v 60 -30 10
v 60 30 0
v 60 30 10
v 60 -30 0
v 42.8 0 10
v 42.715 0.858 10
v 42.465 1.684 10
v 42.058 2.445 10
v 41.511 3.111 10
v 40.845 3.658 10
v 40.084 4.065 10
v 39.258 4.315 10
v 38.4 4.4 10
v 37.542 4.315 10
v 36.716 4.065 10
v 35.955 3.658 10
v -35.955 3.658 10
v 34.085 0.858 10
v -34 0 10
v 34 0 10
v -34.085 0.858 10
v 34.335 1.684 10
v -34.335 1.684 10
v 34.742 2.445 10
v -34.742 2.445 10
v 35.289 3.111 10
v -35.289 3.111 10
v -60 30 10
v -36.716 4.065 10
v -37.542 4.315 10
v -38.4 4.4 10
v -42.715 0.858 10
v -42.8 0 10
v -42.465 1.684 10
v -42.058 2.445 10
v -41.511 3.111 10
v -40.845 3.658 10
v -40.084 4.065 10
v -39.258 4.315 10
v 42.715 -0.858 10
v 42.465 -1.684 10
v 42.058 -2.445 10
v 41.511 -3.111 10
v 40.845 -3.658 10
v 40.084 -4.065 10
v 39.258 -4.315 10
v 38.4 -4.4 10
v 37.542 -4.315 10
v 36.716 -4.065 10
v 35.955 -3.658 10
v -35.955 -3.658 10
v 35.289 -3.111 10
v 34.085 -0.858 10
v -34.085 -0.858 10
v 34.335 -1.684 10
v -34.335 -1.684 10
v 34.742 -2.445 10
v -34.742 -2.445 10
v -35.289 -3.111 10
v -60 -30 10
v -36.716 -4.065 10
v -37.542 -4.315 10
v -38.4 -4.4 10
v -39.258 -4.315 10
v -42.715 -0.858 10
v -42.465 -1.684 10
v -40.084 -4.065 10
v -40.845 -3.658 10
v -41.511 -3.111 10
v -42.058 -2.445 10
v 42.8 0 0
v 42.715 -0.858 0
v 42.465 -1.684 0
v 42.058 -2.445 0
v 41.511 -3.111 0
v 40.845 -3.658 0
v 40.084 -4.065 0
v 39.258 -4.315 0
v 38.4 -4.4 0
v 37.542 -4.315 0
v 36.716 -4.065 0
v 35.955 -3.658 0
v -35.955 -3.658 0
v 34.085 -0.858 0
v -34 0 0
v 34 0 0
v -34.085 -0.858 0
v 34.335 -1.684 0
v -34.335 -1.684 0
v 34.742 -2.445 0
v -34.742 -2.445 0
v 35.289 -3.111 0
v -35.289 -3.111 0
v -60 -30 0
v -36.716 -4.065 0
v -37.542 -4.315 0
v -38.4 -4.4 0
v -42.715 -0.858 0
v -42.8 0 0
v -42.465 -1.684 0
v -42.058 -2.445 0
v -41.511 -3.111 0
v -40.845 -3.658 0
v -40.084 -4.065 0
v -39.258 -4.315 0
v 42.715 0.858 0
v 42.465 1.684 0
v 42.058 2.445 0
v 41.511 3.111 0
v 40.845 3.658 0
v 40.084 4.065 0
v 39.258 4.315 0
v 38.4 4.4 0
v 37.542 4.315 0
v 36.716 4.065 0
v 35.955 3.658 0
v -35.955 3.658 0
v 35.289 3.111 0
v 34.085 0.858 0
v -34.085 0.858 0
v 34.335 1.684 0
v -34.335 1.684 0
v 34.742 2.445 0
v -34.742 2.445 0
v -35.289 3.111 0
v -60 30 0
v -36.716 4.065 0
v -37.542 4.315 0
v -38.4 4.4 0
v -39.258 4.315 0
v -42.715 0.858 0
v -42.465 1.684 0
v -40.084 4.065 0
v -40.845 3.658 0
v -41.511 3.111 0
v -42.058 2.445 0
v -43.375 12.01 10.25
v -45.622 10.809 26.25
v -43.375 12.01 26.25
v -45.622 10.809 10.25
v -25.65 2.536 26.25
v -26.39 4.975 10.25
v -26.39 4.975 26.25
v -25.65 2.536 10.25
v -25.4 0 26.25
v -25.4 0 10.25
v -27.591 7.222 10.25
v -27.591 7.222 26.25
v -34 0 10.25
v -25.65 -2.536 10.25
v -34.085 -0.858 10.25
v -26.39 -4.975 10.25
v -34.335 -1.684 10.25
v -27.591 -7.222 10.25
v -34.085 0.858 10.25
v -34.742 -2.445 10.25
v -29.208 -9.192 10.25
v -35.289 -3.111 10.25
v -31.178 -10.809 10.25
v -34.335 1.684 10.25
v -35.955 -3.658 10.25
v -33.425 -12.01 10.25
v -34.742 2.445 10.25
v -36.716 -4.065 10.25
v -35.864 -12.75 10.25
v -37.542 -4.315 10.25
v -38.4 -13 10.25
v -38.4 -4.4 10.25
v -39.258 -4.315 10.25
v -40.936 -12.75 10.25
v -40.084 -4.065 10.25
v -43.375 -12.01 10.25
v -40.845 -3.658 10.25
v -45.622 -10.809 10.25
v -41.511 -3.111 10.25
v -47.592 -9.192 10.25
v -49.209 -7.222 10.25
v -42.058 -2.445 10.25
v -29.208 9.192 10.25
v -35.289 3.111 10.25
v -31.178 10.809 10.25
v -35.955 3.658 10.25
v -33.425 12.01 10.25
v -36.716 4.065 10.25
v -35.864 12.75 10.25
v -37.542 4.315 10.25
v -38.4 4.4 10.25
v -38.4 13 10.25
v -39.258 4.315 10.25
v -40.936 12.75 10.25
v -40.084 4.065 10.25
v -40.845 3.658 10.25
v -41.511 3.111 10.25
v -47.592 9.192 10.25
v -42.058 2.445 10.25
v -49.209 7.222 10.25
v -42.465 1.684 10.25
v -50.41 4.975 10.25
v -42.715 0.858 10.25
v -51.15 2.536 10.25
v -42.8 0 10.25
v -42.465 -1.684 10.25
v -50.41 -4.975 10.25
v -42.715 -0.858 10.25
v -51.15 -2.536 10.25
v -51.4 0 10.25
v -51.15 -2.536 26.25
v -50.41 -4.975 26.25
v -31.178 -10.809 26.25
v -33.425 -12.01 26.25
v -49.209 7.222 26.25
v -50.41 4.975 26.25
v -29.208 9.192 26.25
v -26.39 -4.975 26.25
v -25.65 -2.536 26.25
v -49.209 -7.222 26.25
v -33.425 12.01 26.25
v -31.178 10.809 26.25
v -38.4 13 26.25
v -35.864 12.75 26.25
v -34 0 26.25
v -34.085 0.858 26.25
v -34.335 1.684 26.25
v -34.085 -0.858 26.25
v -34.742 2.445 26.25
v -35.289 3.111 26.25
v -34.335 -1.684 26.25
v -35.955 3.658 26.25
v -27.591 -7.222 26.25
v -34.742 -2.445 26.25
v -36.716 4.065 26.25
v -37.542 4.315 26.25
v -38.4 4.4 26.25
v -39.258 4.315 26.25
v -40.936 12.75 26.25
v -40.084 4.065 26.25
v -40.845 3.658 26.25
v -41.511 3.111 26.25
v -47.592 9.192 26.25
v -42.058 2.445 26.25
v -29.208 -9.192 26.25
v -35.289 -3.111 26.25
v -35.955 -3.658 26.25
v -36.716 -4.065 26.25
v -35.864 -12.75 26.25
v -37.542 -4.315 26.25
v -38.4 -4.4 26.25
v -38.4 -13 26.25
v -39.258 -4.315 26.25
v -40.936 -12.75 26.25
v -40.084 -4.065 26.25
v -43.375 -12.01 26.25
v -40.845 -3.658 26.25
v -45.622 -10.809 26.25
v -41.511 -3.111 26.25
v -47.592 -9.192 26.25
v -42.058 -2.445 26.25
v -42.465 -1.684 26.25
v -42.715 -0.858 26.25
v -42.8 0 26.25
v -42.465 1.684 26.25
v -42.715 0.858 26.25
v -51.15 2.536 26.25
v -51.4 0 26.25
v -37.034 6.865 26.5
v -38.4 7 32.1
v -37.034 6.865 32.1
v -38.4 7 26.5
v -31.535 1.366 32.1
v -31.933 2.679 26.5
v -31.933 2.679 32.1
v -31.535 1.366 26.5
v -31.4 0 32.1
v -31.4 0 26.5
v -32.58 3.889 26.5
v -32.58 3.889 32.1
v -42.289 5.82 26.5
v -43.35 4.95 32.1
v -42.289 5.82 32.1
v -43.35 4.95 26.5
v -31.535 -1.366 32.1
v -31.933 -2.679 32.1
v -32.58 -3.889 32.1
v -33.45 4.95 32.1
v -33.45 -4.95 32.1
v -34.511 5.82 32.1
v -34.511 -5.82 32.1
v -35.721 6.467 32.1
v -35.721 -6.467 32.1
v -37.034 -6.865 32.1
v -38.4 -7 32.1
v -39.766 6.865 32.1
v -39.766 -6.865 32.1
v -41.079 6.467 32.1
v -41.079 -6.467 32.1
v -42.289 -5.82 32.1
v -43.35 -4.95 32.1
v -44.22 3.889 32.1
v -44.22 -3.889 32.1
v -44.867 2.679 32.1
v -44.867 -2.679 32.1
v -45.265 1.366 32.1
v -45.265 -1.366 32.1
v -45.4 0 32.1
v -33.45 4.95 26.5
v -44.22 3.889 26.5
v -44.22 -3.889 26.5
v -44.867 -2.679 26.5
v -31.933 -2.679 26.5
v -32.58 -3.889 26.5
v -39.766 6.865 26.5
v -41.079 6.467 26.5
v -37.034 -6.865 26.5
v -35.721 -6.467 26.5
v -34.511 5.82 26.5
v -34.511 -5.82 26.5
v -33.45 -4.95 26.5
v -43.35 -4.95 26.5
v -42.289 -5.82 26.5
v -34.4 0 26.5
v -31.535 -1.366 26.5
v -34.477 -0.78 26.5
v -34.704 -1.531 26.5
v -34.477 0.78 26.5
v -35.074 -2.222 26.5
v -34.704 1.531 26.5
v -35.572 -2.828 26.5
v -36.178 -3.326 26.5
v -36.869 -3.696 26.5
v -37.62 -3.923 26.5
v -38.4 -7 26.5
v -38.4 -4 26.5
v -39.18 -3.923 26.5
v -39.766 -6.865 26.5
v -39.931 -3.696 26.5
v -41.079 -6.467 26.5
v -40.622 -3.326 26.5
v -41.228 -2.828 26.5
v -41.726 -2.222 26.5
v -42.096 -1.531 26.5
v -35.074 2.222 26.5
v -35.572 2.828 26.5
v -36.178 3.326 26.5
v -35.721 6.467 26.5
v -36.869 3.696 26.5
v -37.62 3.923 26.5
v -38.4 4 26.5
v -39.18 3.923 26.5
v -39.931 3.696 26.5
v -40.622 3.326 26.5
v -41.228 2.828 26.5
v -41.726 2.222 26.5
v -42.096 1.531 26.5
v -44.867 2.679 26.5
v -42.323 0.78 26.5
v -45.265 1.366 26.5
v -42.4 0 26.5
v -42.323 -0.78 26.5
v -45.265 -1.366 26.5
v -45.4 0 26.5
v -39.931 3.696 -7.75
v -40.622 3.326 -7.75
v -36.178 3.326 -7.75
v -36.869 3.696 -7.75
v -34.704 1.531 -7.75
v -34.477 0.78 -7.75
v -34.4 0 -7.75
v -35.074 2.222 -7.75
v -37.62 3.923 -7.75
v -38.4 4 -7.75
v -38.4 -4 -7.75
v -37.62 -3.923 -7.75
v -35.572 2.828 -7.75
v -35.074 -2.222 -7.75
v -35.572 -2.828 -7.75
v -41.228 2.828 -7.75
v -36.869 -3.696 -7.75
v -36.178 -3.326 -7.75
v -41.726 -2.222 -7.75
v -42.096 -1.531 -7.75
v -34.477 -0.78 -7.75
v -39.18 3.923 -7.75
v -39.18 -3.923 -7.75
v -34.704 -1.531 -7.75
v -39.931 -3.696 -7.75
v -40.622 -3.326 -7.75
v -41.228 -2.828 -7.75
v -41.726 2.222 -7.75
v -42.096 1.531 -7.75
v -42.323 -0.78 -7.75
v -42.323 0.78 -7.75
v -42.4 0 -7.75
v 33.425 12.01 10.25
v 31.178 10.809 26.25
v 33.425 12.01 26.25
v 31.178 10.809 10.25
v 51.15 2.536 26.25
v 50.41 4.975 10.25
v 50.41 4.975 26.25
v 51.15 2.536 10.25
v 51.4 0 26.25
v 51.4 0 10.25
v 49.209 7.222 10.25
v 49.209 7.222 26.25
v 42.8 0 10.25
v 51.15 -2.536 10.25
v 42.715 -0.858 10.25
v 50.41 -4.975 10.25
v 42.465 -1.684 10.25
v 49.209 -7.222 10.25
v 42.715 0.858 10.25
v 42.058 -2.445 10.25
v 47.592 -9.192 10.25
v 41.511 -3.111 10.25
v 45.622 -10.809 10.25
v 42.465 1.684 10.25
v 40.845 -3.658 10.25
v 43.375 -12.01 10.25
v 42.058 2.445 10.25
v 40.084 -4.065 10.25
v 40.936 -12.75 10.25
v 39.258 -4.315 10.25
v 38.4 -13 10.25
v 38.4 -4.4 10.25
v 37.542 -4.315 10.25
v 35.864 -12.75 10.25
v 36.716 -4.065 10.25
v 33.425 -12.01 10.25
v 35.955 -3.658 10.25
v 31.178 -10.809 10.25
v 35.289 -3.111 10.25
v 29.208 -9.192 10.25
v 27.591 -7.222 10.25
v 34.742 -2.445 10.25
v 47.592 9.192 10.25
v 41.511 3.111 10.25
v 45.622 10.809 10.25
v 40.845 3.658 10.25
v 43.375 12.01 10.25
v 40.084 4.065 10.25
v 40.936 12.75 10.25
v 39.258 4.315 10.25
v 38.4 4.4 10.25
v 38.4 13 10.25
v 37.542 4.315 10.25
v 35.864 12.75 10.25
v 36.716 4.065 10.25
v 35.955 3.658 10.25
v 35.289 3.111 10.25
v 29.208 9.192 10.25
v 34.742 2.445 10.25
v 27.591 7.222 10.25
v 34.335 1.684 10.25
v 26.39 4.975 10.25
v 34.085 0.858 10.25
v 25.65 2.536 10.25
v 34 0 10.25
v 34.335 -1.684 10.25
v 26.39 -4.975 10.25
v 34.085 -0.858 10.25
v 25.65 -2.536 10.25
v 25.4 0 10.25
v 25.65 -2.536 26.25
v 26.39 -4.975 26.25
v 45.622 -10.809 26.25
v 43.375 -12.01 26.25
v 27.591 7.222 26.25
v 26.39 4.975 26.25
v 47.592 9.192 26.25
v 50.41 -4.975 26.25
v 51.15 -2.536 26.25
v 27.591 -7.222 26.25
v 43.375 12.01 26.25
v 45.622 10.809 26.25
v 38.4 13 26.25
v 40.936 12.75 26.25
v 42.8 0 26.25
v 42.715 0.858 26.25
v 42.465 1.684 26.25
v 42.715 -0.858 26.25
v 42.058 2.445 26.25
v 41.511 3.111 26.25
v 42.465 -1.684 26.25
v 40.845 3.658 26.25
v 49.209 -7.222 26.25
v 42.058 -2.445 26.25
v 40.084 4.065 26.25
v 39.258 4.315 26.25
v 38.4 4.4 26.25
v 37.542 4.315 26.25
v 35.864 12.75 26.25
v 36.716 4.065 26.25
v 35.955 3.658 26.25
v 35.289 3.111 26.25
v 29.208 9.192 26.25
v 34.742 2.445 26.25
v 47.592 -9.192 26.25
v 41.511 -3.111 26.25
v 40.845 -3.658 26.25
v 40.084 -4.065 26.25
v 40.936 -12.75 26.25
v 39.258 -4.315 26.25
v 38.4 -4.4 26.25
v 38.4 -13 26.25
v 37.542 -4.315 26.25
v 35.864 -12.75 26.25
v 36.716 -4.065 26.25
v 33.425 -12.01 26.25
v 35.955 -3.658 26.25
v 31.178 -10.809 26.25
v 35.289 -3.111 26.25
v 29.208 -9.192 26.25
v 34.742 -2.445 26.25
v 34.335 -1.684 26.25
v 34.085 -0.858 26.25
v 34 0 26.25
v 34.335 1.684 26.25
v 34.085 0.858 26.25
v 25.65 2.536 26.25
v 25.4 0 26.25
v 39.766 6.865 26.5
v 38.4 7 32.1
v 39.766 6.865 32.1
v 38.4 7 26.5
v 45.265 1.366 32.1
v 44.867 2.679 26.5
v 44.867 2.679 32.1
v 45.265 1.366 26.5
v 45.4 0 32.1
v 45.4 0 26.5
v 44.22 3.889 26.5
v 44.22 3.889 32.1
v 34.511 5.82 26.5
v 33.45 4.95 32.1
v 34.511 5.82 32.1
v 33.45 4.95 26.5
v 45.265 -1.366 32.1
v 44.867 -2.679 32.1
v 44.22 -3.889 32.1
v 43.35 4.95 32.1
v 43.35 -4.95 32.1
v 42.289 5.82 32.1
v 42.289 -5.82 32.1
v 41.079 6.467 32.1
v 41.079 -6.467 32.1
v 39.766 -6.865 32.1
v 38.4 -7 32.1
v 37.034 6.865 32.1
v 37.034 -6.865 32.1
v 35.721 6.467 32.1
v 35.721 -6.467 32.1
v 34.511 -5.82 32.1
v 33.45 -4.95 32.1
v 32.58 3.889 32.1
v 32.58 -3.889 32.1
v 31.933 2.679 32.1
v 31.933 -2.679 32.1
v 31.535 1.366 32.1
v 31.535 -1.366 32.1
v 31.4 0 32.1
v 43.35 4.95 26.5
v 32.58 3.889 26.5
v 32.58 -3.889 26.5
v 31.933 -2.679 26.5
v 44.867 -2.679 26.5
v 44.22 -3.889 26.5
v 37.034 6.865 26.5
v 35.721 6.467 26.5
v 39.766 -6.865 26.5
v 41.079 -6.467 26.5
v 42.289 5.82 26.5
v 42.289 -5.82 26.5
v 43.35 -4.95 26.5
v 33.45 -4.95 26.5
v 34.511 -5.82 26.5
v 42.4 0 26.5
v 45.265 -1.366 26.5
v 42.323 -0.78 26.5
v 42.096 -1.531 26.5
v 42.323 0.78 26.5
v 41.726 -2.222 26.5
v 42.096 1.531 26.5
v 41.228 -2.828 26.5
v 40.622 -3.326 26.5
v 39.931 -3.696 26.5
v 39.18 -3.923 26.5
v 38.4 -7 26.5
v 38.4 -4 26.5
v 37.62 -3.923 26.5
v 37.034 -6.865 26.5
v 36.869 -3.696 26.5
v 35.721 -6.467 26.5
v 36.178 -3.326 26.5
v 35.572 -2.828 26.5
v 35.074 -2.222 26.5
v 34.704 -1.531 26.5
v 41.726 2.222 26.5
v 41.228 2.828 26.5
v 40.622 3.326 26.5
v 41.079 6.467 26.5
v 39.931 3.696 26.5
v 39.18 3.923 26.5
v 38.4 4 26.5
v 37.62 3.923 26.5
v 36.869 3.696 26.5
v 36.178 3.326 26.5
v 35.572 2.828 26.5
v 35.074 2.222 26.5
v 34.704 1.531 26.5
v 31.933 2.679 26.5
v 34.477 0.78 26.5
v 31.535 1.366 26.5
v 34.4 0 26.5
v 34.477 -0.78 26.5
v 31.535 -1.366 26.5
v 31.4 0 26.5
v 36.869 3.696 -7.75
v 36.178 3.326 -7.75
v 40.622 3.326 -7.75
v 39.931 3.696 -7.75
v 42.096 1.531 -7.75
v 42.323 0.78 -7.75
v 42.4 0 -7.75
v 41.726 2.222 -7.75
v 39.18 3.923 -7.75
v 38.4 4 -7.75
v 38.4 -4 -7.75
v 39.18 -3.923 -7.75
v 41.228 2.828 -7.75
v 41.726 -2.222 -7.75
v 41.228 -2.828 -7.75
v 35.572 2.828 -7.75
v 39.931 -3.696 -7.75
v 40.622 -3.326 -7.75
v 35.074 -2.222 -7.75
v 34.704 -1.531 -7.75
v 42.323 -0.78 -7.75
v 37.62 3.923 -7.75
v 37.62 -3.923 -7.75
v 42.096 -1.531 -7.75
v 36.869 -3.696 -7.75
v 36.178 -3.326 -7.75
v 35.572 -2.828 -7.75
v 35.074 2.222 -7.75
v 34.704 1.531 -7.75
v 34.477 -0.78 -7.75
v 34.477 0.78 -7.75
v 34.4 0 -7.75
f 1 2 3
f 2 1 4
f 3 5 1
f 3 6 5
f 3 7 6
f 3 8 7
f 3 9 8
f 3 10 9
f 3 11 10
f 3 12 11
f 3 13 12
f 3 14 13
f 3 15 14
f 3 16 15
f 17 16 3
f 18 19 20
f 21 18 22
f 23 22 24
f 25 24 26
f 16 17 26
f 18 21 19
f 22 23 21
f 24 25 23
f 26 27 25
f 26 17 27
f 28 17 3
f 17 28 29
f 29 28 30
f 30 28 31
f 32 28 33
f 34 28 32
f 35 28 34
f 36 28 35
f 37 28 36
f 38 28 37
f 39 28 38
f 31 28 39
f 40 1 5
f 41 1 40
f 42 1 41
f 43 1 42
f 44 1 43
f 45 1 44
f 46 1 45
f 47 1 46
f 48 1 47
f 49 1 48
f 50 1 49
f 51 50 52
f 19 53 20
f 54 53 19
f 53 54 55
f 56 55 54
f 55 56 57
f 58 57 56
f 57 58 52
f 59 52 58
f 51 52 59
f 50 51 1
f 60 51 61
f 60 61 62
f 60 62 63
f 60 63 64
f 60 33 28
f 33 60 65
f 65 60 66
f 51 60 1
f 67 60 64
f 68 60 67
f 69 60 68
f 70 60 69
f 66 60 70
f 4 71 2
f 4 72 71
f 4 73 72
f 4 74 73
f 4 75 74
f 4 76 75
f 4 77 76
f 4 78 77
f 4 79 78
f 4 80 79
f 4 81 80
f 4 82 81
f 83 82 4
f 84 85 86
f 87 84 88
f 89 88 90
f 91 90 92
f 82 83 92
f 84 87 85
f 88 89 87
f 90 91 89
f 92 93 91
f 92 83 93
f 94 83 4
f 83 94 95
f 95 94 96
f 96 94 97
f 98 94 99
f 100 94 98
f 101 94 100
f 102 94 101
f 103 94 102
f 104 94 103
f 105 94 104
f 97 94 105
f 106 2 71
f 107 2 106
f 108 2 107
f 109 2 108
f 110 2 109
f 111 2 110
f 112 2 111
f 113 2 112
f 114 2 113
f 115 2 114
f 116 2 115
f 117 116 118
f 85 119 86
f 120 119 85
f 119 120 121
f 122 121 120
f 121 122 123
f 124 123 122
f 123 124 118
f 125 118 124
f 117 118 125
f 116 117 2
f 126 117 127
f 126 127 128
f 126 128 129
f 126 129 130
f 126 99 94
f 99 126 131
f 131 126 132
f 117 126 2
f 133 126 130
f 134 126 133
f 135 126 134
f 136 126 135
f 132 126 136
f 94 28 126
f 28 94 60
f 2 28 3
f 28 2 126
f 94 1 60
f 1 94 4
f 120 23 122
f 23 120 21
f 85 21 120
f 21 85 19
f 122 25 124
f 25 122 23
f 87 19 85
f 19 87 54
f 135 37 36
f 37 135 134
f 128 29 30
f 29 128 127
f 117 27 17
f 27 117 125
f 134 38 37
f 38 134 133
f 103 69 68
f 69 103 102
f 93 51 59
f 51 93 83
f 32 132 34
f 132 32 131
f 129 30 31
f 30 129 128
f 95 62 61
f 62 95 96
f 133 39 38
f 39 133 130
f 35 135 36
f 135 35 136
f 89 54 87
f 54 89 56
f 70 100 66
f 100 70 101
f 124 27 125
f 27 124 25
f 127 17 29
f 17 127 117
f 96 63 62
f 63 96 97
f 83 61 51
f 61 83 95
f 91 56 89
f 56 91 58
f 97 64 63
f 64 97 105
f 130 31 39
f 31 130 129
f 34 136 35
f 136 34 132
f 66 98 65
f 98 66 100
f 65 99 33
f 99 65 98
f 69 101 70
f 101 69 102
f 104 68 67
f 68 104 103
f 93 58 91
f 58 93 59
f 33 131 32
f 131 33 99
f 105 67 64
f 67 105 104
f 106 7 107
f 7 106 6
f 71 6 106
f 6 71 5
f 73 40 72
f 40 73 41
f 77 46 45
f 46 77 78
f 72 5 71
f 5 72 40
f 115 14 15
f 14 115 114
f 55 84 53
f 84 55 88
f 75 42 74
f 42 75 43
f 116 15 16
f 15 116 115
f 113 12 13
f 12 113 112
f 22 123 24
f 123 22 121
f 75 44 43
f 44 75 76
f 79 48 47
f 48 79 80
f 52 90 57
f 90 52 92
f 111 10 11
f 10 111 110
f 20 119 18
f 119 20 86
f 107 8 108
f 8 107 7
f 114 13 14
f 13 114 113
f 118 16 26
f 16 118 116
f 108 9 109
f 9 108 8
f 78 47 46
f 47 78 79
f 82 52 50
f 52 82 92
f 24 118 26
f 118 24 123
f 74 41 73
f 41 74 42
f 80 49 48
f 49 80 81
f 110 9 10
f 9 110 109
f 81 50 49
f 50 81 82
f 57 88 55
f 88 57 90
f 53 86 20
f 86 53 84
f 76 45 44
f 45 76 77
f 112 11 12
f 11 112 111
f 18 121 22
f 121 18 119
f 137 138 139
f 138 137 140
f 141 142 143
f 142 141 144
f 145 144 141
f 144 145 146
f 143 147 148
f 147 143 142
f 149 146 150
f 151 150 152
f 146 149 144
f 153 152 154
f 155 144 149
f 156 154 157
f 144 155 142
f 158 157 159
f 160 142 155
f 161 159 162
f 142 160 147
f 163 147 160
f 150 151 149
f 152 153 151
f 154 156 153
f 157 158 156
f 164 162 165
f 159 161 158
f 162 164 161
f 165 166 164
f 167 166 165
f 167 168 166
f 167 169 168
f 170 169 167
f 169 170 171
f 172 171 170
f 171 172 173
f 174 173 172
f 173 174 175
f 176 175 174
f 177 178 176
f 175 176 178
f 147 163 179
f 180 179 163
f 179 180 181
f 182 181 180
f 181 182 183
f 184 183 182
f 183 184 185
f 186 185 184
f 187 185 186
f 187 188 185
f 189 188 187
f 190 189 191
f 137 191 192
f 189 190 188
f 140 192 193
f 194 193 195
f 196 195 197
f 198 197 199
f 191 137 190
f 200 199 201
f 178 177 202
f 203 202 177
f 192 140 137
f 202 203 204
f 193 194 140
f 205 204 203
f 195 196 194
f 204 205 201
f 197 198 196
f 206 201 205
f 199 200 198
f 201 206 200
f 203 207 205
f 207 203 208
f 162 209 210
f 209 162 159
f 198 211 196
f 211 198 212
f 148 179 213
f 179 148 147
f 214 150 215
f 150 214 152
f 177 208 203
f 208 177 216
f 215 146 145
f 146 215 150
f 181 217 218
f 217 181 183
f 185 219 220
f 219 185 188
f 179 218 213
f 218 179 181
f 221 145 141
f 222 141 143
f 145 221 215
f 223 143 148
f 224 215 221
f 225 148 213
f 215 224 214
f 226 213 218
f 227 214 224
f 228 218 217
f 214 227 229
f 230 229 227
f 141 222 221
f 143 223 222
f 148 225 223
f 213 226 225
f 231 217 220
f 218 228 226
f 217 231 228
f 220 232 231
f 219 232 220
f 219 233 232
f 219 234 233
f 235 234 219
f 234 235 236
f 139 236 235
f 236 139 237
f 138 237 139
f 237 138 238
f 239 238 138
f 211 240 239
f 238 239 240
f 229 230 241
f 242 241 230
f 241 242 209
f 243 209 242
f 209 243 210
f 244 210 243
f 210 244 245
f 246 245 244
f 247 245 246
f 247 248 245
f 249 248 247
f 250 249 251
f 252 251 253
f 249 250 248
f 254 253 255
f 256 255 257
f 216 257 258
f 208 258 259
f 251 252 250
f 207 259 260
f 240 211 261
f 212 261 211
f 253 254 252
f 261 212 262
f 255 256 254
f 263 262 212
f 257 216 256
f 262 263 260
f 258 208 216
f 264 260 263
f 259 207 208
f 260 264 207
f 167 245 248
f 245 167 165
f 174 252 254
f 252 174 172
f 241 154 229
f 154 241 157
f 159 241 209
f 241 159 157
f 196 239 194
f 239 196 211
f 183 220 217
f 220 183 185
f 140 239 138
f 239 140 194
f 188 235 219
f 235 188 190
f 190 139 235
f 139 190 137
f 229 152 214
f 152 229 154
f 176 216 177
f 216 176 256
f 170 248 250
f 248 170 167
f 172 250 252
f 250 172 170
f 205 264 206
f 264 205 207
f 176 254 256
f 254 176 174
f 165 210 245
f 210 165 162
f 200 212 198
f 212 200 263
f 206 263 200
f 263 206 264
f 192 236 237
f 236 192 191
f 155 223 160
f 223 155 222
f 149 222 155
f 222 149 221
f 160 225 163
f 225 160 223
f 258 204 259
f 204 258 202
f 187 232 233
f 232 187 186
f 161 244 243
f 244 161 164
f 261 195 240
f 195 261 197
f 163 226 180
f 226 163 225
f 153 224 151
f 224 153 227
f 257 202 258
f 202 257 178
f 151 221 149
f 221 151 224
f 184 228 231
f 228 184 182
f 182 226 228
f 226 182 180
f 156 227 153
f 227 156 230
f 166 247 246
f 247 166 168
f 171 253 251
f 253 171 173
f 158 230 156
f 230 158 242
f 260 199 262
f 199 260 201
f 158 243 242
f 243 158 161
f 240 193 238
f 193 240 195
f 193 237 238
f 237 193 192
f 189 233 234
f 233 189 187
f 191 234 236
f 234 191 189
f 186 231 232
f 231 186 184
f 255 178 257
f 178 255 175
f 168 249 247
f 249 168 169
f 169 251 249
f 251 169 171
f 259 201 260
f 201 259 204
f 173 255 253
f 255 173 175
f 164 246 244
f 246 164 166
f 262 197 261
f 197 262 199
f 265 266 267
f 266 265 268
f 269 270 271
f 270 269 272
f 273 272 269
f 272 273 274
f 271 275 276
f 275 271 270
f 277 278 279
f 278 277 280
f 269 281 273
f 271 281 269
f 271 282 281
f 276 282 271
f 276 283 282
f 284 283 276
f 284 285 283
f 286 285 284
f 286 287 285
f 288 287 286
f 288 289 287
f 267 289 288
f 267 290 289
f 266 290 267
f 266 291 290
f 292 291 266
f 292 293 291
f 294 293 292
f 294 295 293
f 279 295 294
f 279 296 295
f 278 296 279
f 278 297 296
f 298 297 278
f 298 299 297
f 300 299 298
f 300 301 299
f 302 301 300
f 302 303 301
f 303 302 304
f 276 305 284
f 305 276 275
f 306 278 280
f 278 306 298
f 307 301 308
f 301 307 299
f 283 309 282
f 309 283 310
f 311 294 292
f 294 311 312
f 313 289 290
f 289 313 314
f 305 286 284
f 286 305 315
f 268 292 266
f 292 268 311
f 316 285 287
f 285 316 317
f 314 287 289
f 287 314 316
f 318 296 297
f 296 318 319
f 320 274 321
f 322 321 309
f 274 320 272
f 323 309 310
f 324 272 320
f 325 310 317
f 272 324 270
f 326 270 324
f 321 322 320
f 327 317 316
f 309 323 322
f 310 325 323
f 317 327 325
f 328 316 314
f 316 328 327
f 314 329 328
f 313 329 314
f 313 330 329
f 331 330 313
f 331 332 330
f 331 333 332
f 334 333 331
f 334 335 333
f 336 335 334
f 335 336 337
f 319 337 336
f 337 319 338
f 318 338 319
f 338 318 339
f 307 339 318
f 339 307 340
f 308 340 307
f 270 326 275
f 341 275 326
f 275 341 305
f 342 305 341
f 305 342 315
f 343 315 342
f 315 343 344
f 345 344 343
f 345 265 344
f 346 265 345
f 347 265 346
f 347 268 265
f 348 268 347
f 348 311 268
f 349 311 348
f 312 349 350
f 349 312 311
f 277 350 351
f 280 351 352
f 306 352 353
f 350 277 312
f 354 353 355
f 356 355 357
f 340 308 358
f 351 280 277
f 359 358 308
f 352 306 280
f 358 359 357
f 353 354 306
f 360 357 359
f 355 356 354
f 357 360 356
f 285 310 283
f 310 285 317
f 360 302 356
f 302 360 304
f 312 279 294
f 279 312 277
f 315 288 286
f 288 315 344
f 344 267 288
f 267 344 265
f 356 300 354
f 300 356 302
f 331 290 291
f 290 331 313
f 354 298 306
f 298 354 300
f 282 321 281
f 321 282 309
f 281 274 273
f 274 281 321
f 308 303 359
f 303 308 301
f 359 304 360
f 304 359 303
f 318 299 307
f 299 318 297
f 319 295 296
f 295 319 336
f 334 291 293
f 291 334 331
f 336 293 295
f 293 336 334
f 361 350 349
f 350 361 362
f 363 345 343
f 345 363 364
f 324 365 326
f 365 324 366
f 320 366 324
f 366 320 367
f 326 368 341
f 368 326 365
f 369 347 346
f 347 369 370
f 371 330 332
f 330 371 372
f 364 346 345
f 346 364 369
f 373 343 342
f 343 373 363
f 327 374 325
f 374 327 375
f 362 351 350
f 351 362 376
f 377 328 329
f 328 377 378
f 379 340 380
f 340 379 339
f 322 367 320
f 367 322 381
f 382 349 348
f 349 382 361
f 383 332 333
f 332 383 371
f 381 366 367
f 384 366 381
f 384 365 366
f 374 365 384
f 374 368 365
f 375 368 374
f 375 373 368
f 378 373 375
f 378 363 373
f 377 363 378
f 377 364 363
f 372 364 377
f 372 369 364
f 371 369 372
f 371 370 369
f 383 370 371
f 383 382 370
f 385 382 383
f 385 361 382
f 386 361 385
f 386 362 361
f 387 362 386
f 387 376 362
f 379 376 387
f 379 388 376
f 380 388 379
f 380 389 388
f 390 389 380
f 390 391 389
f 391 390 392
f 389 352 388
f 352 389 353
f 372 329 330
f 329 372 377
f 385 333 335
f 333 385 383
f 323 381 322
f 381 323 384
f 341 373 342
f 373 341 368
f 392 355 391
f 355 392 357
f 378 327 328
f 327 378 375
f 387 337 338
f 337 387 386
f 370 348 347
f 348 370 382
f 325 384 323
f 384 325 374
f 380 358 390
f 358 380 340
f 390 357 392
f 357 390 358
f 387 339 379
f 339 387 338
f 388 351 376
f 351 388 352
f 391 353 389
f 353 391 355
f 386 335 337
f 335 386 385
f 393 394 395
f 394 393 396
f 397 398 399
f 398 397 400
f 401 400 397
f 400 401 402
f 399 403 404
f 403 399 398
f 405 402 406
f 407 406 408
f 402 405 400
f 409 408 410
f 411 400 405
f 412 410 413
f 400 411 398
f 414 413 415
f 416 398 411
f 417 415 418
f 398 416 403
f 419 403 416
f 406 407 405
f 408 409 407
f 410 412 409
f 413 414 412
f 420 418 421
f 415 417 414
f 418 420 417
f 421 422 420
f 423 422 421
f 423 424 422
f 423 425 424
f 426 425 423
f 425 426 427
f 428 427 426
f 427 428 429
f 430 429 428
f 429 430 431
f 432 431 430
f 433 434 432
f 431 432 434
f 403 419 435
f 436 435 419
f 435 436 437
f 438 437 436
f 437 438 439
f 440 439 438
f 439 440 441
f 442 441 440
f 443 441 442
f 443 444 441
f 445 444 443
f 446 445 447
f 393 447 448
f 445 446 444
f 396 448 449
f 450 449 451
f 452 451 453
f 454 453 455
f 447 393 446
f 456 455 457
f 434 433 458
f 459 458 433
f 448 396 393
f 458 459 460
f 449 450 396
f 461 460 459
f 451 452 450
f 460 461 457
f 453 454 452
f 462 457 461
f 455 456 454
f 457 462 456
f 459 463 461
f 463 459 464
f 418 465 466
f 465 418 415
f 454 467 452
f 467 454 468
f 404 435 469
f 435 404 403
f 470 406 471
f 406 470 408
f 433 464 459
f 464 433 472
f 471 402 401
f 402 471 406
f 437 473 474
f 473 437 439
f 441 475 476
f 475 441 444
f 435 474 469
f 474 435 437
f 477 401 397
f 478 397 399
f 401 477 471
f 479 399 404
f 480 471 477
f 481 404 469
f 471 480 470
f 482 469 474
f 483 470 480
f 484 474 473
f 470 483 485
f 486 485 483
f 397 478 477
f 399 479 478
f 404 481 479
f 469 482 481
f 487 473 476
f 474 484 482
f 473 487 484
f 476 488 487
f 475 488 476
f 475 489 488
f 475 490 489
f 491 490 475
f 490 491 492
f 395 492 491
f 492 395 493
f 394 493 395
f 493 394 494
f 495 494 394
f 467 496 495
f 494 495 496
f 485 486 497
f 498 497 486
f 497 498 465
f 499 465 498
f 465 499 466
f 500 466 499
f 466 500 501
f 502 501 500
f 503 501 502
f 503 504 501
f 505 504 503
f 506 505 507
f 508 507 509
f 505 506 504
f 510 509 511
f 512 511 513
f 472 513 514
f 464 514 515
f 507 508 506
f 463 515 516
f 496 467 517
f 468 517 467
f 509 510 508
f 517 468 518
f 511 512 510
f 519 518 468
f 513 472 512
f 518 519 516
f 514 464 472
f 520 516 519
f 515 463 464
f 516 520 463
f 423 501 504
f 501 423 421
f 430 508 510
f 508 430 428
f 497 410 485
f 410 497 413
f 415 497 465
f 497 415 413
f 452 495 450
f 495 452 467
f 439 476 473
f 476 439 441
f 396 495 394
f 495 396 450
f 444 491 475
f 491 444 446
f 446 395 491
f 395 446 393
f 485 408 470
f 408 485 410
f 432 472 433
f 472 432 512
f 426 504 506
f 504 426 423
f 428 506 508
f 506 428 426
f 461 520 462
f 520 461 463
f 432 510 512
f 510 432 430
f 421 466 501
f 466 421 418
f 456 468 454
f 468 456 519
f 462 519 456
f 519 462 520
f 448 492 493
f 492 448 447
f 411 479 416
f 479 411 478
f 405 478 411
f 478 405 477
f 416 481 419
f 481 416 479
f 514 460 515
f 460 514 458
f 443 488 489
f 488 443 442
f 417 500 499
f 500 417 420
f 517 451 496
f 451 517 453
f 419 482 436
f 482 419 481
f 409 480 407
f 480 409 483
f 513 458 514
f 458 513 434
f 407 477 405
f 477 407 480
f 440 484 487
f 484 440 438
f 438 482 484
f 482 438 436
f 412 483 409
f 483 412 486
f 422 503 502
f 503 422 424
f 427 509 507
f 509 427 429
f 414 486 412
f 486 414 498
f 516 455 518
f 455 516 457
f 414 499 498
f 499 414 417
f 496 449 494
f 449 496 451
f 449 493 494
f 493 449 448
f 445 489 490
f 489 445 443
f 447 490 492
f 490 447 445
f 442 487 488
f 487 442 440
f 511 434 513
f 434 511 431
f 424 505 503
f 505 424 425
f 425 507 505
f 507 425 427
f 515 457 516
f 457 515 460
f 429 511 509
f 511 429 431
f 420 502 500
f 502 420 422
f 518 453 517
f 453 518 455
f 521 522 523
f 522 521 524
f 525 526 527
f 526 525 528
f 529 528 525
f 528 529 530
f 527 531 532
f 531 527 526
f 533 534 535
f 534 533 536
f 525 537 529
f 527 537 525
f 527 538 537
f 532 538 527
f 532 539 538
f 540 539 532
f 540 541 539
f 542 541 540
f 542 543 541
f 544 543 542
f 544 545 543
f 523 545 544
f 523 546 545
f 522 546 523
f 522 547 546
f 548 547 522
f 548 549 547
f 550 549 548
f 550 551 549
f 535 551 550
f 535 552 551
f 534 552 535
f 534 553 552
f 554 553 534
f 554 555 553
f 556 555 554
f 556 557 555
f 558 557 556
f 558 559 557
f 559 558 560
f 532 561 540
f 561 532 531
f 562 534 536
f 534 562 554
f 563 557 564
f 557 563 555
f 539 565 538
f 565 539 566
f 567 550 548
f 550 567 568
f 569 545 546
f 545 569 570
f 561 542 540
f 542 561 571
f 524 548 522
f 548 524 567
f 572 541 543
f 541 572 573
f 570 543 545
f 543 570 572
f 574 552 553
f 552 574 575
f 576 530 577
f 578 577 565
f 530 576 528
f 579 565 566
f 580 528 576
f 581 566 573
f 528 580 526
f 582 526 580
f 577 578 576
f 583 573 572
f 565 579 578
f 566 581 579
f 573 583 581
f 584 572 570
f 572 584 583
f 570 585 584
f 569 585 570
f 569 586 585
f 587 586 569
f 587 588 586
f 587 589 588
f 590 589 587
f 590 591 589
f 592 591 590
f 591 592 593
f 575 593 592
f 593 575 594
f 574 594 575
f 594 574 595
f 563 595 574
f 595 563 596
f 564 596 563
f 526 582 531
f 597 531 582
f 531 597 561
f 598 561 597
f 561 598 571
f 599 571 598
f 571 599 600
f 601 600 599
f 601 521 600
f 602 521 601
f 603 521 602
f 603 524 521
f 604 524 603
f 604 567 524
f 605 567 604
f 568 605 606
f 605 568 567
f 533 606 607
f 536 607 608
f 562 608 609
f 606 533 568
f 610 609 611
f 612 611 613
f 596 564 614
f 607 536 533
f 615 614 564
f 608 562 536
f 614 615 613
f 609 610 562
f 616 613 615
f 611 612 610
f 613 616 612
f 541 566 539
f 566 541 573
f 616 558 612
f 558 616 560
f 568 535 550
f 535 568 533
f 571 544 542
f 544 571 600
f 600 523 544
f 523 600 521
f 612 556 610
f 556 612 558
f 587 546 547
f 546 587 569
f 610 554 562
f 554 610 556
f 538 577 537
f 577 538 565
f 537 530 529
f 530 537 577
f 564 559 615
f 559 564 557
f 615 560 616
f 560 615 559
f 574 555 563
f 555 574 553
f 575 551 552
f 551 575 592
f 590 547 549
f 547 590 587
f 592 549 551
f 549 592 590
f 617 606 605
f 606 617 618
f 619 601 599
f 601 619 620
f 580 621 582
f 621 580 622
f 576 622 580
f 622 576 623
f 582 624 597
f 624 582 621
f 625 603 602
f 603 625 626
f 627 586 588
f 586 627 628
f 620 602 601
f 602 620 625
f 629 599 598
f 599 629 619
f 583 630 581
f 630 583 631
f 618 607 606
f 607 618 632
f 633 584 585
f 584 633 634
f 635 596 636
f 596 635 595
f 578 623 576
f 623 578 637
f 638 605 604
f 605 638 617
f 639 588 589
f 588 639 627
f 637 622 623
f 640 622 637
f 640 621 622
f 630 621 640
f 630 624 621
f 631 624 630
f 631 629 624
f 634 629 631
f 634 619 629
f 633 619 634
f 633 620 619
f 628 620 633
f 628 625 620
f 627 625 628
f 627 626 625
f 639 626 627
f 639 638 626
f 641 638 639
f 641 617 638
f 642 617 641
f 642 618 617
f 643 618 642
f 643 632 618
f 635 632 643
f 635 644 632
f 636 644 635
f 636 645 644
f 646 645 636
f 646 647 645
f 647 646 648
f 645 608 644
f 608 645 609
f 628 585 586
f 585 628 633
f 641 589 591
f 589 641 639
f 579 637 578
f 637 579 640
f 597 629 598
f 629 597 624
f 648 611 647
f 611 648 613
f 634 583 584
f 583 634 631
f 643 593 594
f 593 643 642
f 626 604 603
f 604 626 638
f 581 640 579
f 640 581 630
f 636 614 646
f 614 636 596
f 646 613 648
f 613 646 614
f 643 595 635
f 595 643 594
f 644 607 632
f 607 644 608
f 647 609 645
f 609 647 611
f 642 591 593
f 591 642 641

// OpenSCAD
$fn = 32;

// ------------------------------------------------------------------------
// Standoff columns: 2 d26 standoffs, bolts d8
// Every part is its own module, assembly() places them once.
// ------------------------------------------------------------------------

// --- part 1 ---
module base_plate() {
  difference() {
    translate([-60, -30, 0]) cube([120, 60, 10]);
    translate([-38.4, 0, -1]) cylinder(h = 12, d = 8.8);
    translate([38.4, 0, -1]) cylinder(h = 12, d = 8.8);
  }
}

// --- part 2 ---
module spacer1() {
  difference() {
      translate([0, 0, 0]) cylinder(h = 16, d = 26);
      translate([0, 0, -1]) cylinder(h = 18, d = 8.8);
    }
}

// --- part 3 ---
module bolt1() {
  cylinder(h = 5.6, d = 14);
  translate([0, 0, -34.25]) cylinder(h = 34.25, d = 8);
}

// --- part 4 ---
module spacer2() {
  difference() {
      translate([0, 0, 0]) cylinder(h = 16, d = 26);
      translate([0, 0, -1]) cylinder(h = 18, d = 8.8);
    }
}

// --- part 5 ---
module bolt2() {
  cylinder(h = 5.6, d = 14);
  translate([0, 0, -34.25]) cylinder(h = 34.25, d = 8);
}

// --- assembly ---
module assembly() {
  translate([0, 0, 0]) rotate([0, 0, 0]) base_plate();
  translate([-38.4, 0, 10.25]) rotate([0, 0, 0]) spacer1();
  translate([-38.4, 0, 26.5]) rotate([0, 0, 0]) bolt1();
  translate([38.4, 0, 10.25]) rotate([0, 0, 0]) spacer2();
  translate([38.4, 0, 26.5]) rotate([0, 0, 0]) bolt2();
}

assembly();
